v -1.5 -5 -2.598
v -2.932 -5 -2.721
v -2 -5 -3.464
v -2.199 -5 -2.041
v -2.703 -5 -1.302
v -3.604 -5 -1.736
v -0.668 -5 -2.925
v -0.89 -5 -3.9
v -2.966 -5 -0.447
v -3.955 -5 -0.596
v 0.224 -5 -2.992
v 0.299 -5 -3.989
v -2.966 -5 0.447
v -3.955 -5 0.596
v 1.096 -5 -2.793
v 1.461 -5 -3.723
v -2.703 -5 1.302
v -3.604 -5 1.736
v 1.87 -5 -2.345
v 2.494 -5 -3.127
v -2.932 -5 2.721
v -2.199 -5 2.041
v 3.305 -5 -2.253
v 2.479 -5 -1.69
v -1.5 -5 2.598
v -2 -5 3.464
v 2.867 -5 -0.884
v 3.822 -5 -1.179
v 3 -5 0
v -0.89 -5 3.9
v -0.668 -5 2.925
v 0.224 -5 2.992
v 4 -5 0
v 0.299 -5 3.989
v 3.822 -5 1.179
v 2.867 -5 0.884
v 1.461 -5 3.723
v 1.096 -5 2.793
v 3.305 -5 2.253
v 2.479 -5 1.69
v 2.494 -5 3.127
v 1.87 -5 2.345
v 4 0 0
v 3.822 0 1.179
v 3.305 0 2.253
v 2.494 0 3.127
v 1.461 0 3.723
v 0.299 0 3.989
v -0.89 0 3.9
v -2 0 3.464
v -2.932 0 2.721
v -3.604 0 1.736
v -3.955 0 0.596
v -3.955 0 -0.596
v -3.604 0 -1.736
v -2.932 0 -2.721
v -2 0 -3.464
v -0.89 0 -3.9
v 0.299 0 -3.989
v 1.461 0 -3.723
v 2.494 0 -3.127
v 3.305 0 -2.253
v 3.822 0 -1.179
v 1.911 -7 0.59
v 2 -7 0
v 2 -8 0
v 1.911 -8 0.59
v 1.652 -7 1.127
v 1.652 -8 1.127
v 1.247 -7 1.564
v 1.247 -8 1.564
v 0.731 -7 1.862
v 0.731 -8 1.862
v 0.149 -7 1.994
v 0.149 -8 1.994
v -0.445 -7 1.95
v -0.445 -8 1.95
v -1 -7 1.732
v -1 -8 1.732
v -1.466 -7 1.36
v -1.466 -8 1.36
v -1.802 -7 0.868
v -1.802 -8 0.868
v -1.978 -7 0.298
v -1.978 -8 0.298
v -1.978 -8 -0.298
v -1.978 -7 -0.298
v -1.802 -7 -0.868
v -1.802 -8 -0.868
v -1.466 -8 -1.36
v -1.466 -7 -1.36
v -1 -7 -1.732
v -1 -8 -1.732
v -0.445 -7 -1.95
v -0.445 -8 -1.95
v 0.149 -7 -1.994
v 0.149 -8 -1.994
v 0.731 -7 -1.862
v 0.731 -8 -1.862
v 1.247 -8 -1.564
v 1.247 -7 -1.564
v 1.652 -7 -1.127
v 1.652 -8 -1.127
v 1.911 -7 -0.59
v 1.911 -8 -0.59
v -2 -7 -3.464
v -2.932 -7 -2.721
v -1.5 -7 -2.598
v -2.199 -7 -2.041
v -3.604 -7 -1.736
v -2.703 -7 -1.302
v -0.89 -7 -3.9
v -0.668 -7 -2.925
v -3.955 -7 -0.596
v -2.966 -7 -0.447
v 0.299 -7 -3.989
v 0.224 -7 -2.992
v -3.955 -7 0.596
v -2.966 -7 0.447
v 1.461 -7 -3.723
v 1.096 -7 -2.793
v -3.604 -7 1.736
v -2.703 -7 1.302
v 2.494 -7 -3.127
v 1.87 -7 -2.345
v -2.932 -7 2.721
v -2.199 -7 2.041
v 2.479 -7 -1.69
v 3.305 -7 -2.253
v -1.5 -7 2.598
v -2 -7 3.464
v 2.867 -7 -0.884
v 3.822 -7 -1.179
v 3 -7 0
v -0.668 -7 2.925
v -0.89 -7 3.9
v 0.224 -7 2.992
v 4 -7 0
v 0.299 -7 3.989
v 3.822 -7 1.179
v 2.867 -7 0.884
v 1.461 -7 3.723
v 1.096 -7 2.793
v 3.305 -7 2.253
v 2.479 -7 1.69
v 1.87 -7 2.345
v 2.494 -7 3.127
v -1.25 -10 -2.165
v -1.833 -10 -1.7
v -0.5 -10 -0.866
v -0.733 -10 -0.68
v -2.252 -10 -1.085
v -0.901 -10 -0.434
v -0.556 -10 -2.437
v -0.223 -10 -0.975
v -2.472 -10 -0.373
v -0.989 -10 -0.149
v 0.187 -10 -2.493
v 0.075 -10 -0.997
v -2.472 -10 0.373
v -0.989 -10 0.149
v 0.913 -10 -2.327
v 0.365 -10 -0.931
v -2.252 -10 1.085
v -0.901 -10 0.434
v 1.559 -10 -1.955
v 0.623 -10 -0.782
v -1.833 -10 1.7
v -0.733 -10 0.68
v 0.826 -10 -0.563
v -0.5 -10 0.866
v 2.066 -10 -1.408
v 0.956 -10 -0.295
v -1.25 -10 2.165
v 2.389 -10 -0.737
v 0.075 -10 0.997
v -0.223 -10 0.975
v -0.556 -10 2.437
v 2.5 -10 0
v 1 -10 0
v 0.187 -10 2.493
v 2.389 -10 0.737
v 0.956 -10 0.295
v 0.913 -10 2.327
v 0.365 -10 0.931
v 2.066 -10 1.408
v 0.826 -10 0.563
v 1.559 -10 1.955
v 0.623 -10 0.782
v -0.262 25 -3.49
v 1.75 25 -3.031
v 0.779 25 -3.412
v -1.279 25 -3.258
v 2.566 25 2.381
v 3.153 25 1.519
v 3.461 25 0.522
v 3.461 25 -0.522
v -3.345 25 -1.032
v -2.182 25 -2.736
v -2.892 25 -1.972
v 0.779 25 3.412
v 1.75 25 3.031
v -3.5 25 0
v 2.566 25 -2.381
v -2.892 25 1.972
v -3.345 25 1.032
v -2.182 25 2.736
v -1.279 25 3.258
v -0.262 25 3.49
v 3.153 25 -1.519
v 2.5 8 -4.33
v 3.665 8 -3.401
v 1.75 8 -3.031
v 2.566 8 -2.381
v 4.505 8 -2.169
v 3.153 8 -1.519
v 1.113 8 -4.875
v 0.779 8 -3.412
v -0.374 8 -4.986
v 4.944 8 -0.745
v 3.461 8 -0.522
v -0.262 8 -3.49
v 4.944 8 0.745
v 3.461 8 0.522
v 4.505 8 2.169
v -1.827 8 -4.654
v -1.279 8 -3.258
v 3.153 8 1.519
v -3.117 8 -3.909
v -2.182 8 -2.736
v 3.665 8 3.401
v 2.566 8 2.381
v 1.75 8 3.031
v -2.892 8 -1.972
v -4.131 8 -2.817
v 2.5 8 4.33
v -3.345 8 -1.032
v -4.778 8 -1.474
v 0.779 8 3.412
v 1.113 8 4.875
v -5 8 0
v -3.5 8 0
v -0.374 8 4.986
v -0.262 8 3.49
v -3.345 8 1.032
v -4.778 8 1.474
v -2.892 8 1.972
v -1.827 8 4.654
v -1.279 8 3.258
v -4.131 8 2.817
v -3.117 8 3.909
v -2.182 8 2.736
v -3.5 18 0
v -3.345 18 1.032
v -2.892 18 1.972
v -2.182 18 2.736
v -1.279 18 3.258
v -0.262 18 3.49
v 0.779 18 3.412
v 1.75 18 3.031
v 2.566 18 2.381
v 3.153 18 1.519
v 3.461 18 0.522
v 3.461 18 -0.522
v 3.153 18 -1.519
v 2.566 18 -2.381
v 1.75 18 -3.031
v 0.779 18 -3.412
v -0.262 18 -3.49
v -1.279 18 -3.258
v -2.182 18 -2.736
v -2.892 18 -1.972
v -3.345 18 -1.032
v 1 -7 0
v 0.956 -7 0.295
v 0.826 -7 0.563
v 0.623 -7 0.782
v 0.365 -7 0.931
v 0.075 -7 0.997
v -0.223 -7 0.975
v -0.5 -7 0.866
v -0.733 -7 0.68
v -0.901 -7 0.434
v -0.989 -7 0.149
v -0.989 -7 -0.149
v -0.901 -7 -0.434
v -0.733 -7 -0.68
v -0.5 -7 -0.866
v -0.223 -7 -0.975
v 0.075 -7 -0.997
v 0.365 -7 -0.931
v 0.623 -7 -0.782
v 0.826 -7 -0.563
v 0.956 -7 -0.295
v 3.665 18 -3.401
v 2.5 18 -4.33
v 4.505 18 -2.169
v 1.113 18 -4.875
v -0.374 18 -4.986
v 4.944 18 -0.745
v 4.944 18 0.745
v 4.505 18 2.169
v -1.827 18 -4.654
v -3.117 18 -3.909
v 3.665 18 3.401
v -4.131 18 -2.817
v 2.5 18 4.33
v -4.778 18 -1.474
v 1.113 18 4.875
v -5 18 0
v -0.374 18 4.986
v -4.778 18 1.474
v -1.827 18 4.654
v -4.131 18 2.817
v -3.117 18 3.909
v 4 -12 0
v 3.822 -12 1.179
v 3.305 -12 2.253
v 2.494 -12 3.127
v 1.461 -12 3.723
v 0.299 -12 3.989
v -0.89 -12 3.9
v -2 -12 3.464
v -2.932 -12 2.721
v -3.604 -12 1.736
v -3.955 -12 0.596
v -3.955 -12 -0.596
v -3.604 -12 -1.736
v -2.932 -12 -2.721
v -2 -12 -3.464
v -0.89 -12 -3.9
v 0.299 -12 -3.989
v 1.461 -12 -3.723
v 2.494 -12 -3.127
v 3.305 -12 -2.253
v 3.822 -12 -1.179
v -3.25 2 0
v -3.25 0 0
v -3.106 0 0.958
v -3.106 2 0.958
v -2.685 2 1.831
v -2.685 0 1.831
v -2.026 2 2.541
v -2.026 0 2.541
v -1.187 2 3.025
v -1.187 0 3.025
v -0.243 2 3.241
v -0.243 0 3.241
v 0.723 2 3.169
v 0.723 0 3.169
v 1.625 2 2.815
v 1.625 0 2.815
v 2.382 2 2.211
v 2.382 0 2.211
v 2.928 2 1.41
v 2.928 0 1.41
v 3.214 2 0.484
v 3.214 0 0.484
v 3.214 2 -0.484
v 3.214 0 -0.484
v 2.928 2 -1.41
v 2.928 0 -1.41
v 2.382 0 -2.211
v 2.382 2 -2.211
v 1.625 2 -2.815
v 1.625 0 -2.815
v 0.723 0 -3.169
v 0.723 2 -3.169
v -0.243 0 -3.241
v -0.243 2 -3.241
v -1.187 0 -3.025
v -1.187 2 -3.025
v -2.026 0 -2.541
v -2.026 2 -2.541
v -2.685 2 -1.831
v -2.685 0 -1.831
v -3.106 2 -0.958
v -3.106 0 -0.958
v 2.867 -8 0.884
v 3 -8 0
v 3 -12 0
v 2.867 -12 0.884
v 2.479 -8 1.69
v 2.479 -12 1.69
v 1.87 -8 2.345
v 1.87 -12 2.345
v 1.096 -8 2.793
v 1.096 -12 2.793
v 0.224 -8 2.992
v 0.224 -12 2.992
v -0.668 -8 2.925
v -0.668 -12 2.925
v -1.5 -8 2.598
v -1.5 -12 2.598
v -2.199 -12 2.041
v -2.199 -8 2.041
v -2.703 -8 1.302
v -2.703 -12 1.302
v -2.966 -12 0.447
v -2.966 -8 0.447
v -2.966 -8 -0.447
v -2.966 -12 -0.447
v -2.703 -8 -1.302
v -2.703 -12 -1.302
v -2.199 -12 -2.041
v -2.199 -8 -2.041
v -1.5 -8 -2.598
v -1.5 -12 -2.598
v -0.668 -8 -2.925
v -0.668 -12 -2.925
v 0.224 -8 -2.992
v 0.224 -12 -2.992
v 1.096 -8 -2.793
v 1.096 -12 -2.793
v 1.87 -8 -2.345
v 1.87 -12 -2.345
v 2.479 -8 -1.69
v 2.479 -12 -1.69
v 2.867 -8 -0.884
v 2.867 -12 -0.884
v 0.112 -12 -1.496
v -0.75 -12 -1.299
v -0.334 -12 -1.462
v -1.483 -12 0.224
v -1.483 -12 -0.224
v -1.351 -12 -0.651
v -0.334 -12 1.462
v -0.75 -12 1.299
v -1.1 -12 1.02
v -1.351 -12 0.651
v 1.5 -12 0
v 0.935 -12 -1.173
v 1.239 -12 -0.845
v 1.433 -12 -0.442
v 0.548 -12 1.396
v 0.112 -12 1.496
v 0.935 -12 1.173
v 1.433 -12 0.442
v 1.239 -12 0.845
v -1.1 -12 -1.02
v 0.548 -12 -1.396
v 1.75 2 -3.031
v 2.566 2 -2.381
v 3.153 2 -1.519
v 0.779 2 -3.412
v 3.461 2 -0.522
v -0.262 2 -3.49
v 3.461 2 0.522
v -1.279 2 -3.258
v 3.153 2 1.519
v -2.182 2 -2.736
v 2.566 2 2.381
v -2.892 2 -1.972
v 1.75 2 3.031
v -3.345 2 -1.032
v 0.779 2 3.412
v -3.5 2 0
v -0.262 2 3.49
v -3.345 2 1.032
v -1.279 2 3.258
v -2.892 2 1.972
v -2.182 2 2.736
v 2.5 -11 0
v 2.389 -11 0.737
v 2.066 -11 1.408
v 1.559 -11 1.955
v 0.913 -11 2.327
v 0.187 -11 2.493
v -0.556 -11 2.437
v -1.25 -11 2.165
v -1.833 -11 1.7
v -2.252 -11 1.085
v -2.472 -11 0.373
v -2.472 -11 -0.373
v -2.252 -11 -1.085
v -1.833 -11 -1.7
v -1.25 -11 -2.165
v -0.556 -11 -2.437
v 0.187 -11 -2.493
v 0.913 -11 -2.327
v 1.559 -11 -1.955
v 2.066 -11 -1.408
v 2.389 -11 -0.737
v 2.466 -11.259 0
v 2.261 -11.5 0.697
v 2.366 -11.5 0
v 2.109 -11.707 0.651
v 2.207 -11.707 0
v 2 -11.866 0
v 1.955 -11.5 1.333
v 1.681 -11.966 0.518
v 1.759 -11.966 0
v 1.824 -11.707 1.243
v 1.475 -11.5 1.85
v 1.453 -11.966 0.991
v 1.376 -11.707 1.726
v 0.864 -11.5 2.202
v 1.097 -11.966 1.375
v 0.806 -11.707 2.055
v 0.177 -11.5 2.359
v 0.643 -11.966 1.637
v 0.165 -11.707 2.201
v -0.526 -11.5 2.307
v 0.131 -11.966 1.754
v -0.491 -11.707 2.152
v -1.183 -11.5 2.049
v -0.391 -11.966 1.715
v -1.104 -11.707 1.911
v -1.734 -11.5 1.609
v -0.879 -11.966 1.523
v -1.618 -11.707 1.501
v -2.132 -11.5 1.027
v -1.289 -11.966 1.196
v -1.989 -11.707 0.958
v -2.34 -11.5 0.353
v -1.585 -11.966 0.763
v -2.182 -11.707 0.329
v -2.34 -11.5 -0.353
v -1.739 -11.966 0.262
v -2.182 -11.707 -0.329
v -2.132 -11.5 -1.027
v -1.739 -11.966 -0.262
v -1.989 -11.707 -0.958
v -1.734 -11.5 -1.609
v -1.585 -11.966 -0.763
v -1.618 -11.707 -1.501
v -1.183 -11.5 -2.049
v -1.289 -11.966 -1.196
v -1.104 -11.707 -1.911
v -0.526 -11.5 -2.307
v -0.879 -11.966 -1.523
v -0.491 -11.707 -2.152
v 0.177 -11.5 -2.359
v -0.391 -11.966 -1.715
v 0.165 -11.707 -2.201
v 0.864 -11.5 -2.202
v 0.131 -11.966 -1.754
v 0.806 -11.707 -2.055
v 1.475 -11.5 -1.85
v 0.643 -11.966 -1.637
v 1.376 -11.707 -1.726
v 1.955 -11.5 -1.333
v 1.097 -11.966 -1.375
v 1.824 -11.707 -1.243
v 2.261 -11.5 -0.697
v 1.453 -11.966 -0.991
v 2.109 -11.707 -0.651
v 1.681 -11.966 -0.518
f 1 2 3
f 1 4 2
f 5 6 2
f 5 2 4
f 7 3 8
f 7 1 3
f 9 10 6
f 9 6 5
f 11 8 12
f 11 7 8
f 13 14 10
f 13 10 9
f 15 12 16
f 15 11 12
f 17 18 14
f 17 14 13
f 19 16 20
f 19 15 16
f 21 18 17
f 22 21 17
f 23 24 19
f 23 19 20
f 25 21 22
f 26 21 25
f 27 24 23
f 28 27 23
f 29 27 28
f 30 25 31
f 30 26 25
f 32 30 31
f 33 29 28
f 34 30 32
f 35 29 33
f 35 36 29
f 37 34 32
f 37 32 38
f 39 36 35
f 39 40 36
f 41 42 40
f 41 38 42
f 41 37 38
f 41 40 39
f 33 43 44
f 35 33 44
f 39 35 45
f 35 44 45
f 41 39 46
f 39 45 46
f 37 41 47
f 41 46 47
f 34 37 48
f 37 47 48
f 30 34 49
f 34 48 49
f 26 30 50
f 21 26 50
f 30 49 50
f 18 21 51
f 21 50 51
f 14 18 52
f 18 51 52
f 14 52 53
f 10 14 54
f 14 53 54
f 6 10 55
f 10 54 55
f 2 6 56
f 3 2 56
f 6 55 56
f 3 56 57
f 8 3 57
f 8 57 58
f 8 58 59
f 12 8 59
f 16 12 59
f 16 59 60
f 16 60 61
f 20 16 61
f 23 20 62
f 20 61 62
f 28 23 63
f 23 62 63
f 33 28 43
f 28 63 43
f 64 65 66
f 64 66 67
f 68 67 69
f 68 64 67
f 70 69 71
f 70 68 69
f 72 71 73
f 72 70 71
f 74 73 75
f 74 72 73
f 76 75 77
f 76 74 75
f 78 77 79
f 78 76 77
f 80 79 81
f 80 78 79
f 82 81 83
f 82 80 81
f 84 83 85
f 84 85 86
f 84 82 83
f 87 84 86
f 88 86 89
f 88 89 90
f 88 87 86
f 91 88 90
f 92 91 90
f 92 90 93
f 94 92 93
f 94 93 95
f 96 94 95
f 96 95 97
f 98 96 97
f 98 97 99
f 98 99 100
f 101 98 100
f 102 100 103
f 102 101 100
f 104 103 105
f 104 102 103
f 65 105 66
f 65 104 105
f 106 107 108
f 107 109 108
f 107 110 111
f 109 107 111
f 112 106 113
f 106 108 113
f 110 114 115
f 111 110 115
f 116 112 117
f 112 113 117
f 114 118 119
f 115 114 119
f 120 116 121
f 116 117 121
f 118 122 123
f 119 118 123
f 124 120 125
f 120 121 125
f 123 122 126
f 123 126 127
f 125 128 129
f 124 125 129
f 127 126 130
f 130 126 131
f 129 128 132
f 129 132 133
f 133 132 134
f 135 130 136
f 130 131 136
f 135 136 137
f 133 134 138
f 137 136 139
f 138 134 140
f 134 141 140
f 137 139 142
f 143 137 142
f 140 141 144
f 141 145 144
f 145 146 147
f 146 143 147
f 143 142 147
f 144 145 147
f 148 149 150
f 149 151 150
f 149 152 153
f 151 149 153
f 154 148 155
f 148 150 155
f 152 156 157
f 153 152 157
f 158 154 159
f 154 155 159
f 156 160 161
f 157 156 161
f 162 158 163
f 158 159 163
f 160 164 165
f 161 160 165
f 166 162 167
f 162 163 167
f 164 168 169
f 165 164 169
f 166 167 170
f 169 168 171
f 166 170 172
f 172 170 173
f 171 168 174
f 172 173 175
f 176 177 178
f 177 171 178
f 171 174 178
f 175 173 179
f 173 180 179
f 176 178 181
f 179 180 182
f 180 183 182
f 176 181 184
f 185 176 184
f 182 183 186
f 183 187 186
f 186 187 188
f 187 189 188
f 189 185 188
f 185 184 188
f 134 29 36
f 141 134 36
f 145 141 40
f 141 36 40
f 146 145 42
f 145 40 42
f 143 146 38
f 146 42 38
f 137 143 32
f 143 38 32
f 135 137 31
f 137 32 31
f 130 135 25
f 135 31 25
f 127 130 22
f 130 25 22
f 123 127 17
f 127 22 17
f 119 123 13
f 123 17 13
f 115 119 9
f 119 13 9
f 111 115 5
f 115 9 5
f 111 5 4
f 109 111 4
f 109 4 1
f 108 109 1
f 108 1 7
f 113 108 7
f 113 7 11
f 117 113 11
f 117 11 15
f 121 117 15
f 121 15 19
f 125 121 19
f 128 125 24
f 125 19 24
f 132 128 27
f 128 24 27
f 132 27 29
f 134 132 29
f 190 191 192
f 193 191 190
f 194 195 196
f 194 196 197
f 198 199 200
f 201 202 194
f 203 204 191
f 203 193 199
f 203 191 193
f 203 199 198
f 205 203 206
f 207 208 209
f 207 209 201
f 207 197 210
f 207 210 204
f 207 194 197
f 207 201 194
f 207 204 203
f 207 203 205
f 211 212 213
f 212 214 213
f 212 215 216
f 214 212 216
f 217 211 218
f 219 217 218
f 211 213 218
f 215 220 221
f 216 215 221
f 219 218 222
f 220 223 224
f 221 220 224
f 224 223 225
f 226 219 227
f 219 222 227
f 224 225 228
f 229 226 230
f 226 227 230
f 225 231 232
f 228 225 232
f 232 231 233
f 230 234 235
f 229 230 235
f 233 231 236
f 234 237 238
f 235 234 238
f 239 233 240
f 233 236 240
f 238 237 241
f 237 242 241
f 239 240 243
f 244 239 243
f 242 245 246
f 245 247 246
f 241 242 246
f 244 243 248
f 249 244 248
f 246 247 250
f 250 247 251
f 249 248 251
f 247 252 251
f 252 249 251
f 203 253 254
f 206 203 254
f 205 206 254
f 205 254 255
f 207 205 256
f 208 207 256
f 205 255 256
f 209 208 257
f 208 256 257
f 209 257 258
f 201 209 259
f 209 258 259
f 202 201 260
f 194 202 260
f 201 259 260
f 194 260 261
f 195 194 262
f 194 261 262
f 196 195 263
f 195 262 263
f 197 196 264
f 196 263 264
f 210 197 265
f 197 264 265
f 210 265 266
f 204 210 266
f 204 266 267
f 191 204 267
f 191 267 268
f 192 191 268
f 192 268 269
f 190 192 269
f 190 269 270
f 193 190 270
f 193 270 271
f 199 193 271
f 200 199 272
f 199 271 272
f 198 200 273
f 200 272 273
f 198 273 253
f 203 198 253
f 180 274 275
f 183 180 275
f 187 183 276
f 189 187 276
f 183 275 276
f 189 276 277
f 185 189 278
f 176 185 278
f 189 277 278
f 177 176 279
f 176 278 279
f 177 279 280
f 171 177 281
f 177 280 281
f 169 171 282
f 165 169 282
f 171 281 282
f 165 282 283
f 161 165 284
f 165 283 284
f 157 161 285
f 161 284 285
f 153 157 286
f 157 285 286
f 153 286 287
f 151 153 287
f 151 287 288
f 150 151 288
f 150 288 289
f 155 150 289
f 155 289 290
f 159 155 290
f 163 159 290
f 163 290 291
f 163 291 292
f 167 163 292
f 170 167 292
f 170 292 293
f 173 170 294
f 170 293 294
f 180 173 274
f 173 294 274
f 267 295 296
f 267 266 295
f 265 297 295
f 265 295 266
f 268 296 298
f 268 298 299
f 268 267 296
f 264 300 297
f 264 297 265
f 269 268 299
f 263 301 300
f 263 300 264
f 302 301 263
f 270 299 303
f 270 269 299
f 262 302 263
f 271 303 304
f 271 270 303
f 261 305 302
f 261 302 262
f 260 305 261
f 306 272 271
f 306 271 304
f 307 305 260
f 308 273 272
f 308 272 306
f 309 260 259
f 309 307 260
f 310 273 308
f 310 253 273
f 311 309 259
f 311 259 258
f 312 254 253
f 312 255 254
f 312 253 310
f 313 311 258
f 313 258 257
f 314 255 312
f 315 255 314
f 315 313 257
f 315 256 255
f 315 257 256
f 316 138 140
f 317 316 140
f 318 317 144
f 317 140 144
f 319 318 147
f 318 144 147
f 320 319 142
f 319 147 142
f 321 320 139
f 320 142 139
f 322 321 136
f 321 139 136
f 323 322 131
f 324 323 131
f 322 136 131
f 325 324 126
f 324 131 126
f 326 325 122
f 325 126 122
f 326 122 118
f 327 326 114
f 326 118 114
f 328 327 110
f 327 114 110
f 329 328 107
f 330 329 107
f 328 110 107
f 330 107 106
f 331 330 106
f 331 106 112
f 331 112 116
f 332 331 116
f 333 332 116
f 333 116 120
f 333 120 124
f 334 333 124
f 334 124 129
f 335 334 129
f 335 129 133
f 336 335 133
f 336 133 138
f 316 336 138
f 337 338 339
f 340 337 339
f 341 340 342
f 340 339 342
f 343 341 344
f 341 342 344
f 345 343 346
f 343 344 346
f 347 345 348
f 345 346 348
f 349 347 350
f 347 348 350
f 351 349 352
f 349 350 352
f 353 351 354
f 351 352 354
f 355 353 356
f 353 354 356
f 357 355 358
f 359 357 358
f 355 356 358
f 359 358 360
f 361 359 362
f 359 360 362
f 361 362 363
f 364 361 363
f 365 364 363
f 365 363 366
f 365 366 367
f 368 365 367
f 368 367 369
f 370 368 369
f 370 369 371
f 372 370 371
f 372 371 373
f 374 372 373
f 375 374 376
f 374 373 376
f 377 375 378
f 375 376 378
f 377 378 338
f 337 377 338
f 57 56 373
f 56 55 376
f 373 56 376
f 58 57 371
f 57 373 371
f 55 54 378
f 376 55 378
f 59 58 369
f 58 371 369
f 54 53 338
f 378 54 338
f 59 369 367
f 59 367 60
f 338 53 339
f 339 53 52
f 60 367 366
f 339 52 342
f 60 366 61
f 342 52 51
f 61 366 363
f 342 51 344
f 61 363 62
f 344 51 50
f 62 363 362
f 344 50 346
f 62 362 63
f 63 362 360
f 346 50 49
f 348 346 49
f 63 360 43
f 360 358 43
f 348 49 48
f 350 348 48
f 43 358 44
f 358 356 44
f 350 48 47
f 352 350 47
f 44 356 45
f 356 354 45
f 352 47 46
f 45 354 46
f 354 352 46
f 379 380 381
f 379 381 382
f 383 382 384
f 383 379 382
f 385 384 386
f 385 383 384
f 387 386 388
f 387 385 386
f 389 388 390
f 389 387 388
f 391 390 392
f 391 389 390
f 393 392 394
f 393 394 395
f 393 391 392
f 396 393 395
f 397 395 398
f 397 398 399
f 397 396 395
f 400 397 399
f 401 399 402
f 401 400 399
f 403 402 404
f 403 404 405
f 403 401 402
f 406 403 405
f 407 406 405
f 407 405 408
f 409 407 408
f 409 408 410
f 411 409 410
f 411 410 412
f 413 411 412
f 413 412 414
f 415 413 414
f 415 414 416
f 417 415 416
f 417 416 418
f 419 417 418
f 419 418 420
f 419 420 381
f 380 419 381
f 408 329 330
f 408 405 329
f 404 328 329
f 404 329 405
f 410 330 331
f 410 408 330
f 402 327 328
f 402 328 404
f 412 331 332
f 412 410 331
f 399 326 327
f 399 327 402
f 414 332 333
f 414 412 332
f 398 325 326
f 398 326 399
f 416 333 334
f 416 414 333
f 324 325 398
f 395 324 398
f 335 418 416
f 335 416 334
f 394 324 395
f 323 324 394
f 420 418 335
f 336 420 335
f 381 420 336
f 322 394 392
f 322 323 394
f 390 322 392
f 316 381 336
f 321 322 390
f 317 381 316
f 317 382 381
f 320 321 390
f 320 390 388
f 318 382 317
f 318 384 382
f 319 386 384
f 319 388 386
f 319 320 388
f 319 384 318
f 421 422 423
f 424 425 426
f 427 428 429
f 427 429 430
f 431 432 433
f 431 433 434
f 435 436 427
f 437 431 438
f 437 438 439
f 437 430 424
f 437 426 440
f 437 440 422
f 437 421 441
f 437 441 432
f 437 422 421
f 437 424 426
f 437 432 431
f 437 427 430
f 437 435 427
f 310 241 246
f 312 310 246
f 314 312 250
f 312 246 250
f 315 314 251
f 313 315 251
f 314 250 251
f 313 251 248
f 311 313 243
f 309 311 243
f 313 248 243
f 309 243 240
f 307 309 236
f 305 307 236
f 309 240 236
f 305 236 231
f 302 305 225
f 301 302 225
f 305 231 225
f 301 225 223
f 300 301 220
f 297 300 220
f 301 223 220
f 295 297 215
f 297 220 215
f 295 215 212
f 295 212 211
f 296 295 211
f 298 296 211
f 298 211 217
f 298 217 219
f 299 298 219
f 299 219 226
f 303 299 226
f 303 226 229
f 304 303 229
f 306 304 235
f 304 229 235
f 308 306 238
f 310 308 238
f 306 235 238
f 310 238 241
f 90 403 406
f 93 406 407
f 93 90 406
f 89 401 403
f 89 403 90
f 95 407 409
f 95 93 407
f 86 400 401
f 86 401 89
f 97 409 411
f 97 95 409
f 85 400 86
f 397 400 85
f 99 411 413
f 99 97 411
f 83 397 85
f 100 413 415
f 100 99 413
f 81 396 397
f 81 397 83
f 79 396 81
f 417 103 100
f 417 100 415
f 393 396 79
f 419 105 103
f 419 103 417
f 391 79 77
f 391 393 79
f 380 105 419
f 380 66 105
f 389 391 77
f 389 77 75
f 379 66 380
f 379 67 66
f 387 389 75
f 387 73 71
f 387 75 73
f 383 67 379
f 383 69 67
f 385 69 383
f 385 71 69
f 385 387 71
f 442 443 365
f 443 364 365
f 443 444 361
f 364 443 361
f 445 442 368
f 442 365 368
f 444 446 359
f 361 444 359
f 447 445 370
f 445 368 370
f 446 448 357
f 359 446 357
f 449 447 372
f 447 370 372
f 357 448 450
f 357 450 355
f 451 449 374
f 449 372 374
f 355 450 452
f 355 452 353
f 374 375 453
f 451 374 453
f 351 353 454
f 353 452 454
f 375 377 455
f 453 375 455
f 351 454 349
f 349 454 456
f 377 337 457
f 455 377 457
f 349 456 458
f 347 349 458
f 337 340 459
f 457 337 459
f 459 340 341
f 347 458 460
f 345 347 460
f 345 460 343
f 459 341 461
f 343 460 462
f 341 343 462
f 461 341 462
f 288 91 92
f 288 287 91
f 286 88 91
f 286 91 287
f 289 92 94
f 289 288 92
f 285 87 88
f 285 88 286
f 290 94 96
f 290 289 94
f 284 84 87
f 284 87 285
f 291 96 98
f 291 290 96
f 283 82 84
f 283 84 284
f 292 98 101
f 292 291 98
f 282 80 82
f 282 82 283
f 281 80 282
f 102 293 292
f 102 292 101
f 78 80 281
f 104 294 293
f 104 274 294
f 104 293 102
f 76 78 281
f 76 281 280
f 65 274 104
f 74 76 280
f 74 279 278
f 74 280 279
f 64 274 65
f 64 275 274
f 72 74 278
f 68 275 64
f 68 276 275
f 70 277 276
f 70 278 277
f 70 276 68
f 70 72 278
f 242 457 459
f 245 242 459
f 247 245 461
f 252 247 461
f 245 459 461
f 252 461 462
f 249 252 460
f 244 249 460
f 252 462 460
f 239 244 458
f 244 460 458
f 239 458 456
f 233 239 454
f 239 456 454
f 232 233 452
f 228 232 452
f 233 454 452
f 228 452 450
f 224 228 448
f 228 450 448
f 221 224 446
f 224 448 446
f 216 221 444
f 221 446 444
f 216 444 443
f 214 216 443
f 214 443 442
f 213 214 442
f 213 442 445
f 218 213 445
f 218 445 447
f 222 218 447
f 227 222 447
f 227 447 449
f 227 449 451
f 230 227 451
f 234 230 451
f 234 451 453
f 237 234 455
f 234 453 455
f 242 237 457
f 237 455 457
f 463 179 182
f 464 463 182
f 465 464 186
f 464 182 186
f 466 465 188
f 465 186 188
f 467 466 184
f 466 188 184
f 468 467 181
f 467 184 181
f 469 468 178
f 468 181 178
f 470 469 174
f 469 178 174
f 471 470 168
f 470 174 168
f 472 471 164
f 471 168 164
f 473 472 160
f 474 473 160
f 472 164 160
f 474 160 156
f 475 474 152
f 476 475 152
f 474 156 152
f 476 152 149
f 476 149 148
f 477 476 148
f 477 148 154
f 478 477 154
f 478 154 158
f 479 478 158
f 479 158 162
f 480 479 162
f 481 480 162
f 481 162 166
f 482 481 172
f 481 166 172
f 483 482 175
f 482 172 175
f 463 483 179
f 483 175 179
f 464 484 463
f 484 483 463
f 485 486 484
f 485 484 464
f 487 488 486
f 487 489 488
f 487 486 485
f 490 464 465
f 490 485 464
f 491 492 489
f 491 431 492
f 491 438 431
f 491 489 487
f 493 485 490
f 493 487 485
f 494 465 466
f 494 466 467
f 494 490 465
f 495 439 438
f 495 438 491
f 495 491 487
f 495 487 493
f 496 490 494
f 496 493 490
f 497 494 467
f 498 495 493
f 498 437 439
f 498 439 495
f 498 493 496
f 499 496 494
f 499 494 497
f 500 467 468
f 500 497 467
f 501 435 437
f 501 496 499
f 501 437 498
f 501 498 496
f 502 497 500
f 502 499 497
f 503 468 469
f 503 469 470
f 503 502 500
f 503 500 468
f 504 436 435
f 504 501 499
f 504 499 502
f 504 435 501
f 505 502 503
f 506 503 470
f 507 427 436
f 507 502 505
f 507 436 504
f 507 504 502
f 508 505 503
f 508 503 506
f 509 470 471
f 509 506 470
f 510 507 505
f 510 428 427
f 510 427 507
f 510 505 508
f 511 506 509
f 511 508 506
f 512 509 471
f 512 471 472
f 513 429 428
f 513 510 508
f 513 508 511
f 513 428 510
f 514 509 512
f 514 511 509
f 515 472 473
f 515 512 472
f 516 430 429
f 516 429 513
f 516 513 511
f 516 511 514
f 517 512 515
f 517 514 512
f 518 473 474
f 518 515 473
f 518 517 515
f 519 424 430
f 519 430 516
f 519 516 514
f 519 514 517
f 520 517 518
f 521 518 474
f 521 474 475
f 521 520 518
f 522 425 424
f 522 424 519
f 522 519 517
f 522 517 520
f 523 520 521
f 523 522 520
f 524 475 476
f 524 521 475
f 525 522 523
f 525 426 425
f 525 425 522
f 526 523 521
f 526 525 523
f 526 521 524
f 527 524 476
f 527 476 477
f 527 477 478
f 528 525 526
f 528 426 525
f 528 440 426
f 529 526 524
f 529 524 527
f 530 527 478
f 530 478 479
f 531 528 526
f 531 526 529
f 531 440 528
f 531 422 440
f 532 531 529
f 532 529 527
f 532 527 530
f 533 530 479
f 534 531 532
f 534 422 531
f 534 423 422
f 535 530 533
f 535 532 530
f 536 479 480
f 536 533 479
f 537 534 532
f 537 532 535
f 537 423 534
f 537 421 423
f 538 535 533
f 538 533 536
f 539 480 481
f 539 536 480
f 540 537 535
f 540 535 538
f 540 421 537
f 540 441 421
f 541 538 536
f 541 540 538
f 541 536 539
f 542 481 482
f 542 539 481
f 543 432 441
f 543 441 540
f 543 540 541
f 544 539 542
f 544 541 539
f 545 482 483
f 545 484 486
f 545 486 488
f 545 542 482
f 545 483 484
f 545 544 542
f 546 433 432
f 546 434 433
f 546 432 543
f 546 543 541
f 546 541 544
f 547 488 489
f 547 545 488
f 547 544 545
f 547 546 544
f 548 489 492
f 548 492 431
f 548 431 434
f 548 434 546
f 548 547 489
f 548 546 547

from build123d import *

# Parameters (mm, degrees)
F0_R      = 4
F1_DEPTH  = 5
F2_R      = 3
F3_DEPTH  = 2
F4_R      = 4
F4_R_2    = 3
F5_DEPTH  = 5
F6_R      = 1
F7_DEPTH  = 3
F8_R      = 2.5
F8_R_2    = 1
F9_DEPTH  = 2
F10_R     = 1
F4_R_3    = 2
F11_DEPTH = 1
F12_R     = 3.25
F13_DEPTH = 2
F14_R     = 3.5
F14_R_2   = 3.25
F15_DEPTH = 6
F16_R     = 5
F16_R_2   = 3.5
F17_DEPTH = 10
F18_R     = 3.5
F19_DEPTH = 7


with BuildPart() as f1:
    # F0 (on Front) → F1 (new body)
    with BuildSketch(Plane.XZ):
        Circle(F0_R)
    extrude(amount=F1_DEPTH)

    # F2 (on face) → F3 (join)
    with BuildSketch(Plane.XZ.offset(5)):
        Circle(F2_R)
    extrude(amount=F3_DEPTH)

    # F6 (on face) → F7 (join)
    with BuildSketch(Plane.XZ.offset(7)):
        Circle(F6_R)
    extrude(amount=F7_DEPTH)

    # F8 (on face) → F9 (join)
    with BuildSketch(Plane.XZ.offset(10)):
        Circle(F8_R)
        Circle(F8_R_2, mode=Mode.SUBTRACT)
        Circle(F8_R_2)
    extrude(amount=F9_DEPTH)

    # F10
    f10_edges = [f1.edges().sort_by_distance(p)[0] for p in [
        (-2.5, -12, 0),
    ]]
    fillet(f10_edges, radius=F10_R)



with BuildPart() as f5:
    # F4 (on face) → F5 (new body)
    with BuildSketch(Plane.XZ.offset(7)):
        Circle(F4_R)
        Circle(F4_R_2, mode=Mode.SUBTRACT)
    extrude(amount=F5_DEPTH)


with BuildPart() as f1_1:
    add(f1.part)

    add(f5.part)  # F11 merges F5
    # F4 (on face) → F11 (join)
    with BuildSketch(Plane.XZ.offset(7)):
        Circle(F4_R)
        Circle(F4_R_2, mode=Mode.SUBTRACT)
        Circle(F4_R_2)
        Circle(F4_R_3, mode=Mode.SUBTRACT)
    extrude(amount=F11_DEPTH)

    # F12 (on face) → F13 (join)
    with BuildSketch(Plane(origin=(0, 0, 0), x_dir=(-1, 0, 0), z_dir=(0, 1, 0))):
        Circle(F12_R)
    extrude(amount=F13_DEPTH)

    # F14 (on face) → F15 (join)
    with BuildSketch(Plane(origin=(0, 2, 0), x_dir=(-1, 0, 0), z_dir=(0, 1, 0))):
        Circle(F14_R)
        Circle(F14_R_2, mode=Mode.SUBTRACT)
        Circle(F14_R_2)
    extrude(amount=F15_DEPTH)

    # F16 (on face) → F17 (join)
    with BuildSketch(Plane(origin=(0, 8, 0), x_dir=(-1, 0, 0), z_dir=(0, 1, 0))):
        Circle(F16_R)
        Circle(F16_R_2, mode=Mode.SUBTRACT)
        Circle(F16_R_2)
    extrude(amount=F17_DEPTH)

    # F18 (on face) → F19 (join)
    with BuildSketch(Plane(origin=(0, 18, 0), x_dir=(-1, 0, 0), z_dir=(0, 1, 0))):
        Circle(F18_R)
    extrude(amount=F19_DEPTH)


solid = f1_1.part
